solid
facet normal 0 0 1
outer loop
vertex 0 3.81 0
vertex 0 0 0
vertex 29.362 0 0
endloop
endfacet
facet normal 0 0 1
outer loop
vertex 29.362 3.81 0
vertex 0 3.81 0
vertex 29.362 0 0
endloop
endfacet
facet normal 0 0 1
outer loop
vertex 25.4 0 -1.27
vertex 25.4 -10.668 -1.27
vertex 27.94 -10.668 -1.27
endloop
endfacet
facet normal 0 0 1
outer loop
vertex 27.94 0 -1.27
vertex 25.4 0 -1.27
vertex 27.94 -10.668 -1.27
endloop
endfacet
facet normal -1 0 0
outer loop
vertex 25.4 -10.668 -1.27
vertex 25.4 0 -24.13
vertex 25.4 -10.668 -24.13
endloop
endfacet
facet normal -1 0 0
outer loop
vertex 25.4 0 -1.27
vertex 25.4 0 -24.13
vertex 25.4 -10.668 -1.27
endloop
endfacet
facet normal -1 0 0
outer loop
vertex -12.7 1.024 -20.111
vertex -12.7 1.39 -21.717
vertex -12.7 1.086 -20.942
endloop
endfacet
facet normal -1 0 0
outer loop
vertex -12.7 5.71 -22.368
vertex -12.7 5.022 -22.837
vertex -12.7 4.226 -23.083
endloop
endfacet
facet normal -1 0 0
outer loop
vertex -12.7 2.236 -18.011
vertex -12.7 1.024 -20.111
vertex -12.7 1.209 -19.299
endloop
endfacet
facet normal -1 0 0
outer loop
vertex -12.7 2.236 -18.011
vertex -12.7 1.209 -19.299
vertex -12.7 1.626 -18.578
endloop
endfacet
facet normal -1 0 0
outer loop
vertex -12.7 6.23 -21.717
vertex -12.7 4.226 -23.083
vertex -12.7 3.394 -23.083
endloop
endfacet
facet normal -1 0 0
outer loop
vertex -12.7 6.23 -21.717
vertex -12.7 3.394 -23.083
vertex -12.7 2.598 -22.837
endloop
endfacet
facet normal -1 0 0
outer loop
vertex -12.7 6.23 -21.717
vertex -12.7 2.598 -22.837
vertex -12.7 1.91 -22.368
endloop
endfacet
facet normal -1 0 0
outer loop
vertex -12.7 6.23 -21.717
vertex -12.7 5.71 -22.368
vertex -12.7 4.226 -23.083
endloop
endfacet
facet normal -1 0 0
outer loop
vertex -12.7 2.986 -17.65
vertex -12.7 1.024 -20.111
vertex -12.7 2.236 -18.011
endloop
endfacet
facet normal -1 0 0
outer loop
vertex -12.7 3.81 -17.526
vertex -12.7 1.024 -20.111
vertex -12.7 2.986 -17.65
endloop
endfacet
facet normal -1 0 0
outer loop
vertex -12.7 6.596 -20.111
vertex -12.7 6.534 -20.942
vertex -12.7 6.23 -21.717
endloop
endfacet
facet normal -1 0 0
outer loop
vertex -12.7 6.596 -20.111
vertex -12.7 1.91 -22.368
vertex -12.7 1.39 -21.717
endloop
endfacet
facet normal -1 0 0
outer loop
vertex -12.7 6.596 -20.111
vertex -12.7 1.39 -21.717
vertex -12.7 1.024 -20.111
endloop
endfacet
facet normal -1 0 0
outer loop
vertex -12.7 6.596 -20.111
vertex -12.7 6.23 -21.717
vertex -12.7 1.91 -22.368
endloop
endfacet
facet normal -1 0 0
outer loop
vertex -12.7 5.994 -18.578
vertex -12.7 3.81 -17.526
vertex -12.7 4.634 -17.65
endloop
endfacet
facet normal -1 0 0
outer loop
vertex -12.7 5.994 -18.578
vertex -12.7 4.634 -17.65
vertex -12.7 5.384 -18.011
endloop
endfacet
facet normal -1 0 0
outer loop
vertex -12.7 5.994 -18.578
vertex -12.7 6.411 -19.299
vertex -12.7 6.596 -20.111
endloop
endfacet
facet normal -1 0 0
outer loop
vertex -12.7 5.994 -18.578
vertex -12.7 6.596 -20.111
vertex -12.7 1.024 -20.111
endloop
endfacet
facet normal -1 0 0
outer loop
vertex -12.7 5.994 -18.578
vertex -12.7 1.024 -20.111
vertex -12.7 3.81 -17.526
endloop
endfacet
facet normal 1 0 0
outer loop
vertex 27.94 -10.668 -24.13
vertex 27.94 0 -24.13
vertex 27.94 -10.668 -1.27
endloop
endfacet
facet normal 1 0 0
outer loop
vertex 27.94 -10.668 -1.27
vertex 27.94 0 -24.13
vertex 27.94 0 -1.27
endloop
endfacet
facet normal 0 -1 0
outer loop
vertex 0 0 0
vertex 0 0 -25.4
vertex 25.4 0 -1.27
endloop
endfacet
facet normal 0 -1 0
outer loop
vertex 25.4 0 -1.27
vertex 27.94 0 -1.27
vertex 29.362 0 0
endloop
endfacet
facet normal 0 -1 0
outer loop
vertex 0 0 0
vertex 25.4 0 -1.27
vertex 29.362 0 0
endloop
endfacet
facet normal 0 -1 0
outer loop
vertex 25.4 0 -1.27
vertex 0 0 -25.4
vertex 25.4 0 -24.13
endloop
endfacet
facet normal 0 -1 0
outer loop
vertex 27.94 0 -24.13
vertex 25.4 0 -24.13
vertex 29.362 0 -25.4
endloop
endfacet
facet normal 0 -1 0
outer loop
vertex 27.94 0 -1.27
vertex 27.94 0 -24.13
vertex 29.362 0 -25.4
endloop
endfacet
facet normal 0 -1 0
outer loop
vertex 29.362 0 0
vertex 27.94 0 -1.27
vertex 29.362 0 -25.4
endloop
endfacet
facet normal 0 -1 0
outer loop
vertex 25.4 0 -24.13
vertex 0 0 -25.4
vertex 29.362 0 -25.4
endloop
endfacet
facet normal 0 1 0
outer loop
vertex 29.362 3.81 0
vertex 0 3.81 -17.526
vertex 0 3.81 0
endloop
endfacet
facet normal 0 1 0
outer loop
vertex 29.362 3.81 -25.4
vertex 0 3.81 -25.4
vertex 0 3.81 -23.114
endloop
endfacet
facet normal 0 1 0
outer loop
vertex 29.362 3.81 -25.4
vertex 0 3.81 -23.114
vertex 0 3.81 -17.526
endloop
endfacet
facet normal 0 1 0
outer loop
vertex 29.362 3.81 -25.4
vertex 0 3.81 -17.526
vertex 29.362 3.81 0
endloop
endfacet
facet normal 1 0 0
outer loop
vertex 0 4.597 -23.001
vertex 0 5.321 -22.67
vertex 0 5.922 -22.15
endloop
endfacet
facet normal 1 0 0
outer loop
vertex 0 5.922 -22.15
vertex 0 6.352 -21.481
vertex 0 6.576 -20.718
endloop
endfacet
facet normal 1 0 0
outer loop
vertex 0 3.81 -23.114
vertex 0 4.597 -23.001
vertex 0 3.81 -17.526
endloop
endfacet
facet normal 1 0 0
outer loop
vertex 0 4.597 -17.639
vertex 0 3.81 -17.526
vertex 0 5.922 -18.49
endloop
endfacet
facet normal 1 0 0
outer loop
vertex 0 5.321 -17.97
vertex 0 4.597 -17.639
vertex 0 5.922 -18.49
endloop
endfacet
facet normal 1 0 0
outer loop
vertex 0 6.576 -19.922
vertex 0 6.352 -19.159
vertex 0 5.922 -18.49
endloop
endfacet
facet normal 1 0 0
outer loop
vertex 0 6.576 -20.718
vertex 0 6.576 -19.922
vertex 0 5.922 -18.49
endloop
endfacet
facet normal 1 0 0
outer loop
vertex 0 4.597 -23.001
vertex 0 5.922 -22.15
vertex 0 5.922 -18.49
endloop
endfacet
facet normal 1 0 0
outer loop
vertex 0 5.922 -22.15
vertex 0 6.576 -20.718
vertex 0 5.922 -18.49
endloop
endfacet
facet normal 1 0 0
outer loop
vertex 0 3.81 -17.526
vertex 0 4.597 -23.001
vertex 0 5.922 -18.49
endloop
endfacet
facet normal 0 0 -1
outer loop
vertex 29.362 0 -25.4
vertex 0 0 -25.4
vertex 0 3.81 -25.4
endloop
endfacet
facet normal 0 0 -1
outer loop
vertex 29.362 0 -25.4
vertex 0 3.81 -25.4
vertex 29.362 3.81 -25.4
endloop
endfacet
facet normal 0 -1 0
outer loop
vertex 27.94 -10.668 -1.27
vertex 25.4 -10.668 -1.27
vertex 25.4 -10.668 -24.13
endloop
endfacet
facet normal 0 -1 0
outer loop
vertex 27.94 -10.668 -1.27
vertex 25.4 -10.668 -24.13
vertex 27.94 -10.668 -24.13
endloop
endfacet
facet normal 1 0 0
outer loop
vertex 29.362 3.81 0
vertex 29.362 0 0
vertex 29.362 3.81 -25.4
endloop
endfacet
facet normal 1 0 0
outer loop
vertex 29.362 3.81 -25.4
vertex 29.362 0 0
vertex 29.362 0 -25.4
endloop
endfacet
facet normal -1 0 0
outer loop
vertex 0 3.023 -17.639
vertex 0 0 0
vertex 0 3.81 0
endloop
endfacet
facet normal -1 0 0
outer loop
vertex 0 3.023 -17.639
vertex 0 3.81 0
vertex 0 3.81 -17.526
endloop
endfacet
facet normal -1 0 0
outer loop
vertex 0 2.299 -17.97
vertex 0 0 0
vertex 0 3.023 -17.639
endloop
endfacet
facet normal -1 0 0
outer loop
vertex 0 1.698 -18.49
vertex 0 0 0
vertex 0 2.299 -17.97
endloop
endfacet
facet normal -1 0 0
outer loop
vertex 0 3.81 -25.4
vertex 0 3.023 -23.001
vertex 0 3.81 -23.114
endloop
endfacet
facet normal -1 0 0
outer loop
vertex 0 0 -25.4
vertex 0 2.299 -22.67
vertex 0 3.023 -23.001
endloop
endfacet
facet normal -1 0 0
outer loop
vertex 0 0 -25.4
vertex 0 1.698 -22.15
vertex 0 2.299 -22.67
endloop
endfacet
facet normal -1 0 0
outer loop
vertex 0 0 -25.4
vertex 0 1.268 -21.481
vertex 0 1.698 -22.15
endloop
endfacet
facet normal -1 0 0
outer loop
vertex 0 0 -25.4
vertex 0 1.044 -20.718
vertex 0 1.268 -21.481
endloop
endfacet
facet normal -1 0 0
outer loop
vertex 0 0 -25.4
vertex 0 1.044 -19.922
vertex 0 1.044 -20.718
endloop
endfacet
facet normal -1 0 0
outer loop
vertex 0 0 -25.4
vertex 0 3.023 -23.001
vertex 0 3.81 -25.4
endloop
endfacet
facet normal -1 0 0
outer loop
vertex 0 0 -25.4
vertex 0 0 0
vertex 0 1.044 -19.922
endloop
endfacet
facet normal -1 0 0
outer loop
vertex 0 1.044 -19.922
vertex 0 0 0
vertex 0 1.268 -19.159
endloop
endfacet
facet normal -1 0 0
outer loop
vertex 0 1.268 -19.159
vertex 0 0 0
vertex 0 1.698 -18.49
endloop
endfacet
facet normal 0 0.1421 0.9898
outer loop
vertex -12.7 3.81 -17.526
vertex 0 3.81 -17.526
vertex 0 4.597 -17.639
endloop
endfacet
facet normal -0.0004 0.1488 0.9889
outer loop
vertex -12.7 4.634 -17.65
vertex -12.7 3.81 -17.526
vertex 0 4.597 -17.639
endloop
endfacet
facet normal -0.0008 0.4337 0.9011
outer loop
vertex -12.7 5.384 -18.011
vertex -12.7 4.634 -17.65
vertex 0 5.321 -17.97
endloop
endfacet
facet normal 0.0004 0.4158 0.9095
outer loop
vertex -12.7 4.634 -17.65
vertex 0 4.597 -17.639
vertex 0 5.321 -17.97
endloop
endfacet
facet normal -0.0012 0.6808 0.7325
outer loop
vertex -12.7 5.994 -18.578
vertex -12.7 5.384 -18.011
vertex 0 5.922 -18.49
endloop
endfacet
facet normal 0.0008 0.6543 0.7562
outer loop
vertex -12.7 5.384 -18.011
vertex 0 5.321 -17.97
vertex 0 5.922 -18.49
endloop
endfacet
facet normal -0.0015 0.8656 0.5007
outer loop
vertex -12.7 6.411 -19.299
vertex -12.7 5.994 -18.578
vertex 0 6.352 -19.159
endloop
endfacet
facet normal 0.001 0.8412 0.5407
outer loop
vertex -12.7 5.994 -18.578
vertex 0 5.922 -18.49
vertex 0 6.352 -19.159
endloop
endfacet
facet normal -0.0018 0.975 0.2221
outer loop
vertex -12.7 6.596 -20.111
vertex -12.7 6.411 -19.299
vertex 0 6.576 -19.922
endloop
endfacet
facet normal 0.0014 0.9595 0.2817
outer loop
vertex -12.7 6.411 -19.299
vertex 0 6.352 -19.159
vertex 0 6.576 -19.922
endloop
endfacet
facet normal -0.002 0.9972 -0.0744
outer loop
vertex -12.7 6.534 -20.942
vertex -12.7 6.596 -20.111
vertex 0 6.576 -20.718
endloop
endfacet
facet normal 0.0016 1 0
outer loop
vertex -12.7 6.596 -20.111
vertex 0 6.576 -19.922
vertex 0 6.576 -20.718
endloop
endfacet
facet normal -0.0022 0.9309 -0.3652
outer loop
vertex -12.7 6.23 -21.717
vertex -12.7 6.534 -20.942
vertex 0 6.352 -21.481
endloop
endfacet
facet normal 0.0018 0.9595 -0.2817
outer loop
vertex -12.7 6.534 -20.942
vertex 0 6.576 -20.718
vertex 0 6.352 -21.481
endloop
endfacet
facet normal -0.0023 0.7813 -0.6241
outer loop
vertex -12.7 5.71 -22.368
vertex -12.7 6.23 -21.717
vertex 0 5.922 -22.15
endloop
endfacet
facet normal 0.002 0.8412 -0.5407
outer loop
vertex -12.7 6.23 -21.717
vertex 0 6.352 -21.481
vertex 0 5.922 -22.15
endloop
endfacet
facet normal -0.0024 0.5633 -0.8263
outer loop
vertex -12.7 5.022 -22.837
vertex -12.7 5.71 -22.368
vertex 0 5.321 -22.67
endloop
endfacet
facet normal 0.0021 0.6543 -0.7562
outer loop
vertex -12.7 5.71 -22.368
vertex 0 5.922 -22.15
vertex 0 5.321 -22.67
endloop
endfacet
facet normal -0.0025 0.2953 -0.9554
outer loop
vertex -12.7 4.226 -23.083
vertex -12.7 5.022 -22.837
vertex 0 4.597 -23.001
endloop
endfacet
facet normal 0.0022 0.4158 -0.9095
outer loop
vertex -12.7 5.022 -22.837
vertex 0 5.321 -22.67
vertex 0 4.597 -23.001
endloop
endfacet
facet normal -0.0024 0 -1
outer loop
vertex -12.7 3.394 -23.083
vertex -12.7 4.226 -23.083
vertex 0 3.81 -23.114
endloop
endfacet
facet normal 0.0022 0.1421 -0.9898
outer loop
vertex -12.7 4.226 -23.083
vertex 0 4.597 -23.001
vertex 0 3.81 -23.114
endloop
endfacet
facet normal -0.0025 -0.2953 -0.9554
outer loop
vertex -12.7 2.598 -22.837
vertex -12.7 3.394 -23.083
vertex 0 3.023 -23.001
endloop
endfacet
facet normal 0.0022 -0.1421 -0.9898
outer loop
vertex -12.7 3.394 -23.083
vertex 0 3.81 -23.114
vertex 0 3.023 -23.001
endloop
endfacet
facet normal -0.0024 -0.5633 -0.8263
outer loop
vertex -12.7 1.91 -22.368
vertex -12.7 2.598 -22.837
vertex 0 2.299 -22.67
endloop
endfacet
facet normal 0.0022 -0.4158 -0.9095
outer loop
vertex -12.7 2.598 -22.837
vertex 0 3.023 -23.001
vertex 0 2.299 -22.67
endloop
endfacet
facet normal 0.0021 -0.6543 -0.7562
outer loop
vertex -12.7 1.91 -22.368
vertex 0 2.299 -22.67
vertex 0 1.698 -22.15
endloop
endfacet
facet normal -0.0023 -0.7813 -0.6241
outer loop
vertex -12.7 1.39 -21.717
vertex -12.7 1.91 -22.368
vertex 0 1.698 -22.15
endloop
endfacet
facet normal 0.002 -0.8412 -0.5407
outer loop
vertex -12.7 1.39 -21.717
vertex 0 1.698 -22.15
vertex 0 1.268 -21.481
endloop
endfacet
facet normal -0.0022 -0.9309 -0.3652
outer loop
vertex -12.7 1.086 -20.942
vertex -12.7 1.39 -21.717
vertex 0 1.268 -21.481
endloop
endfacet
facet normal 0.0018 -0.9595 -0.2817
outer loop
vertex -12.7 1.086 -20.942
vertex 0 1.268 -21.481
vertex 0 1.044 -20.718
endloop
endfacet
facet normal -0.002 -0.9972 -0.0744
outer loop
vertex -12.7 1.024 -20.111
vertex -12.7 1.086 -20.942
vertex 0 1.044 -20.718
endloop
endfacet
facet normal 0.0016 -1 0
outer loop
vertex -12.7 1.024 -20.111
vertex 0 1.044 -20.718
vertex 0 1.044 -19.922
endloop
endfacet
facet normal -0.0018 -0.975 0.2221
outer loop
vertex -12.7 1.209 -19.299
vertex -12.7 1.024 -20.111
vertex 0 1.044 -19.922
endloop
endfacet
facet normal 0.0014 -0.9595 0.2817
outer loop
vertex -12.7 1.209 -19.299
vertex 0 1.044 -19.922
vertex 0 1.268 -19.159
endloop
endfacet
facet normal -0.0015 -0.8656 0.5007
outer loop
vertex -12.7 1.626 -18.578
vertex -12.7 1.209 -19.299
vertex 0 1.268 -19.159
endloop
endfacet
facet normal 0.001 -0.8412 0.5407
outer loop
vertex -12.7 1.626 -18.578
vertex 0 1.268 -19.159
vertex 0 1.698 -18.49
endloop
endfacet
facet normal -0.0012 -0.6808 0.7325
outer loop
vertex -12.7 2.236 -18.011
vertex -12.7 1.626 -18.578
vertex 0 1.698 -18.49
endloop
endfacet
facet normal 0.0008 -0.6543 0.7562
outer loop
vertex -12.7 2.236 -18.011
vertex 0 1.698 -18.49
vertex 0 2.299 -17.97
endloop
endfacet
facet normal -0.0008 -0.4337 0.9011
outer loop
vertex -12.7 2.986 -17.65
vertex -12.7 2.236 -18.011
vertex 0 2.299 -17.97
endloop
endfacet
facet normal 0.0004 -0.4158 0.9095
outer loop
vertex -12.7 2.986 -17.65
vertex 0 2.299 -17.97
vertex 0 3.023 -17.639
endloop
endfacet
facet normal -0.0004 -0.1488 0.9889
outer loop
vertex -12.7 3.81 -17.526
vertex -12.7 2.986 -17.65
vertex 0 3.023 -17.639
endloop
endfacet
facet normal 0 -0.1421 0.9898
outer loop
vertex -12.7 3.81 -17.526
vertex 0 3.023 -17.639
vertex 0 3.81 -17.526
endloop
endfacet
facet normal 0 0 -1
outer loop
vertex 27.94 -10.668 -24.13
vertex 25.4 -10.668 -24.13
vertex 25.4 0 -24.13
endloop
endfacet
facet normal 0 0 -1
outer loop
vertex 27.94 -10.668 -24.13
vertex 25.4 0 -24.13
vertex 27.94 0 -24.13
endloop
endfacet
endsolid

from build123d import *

# Parameters (mm, degrees)
SKETCH1_W           = 29.3624
SKETCH1_H           = 25.4
BOSS_EXTRUDE1_DEPTH = 3.81
SKETCH2_W           = 2.54
SKETCH2_H           = 22.86
BOSS_EXTRUDE2_DEPTH = 10.668
SKETCH3_R           = 2.794
BOSS_EXTRUDE3_DEPTH = 12.7


with BuildPart() as part:
    # Sketch1 → Boss-Extrude1 (new body)
    with BuildSketch(Plane(origin=(0, 0, 0), x_dir=(1, 0, 0), z_dir=(0, 1, 0))):
        with Locations((14.6812, 12.7)):
            Rectangle(SKETCH1_W, SKETCH1_H)
    extrude(amount=BOSS_EXTRUDE1_DEPTH)

    # Sketch2 → Boss-Extrude2 (add)
    with BuildSketch(Plane.XZ):
        with Locations((26.67, -12.7)):
            Rectangle(SKETCH2_W, SKETCH2_H)
    extrude(amount=BOSS_EXTRUDE2_DEPTH)

    # Sketch3 → Boss-Extrude3 (add)
    with BuildSketch(Plane.ZY):
        with Locations((-20.32, 3.81)):
            Circle(SKETCH3_R)
    extrude(amount=BOSS_EXTRUDE3_DEPTH)


solid = part.part
